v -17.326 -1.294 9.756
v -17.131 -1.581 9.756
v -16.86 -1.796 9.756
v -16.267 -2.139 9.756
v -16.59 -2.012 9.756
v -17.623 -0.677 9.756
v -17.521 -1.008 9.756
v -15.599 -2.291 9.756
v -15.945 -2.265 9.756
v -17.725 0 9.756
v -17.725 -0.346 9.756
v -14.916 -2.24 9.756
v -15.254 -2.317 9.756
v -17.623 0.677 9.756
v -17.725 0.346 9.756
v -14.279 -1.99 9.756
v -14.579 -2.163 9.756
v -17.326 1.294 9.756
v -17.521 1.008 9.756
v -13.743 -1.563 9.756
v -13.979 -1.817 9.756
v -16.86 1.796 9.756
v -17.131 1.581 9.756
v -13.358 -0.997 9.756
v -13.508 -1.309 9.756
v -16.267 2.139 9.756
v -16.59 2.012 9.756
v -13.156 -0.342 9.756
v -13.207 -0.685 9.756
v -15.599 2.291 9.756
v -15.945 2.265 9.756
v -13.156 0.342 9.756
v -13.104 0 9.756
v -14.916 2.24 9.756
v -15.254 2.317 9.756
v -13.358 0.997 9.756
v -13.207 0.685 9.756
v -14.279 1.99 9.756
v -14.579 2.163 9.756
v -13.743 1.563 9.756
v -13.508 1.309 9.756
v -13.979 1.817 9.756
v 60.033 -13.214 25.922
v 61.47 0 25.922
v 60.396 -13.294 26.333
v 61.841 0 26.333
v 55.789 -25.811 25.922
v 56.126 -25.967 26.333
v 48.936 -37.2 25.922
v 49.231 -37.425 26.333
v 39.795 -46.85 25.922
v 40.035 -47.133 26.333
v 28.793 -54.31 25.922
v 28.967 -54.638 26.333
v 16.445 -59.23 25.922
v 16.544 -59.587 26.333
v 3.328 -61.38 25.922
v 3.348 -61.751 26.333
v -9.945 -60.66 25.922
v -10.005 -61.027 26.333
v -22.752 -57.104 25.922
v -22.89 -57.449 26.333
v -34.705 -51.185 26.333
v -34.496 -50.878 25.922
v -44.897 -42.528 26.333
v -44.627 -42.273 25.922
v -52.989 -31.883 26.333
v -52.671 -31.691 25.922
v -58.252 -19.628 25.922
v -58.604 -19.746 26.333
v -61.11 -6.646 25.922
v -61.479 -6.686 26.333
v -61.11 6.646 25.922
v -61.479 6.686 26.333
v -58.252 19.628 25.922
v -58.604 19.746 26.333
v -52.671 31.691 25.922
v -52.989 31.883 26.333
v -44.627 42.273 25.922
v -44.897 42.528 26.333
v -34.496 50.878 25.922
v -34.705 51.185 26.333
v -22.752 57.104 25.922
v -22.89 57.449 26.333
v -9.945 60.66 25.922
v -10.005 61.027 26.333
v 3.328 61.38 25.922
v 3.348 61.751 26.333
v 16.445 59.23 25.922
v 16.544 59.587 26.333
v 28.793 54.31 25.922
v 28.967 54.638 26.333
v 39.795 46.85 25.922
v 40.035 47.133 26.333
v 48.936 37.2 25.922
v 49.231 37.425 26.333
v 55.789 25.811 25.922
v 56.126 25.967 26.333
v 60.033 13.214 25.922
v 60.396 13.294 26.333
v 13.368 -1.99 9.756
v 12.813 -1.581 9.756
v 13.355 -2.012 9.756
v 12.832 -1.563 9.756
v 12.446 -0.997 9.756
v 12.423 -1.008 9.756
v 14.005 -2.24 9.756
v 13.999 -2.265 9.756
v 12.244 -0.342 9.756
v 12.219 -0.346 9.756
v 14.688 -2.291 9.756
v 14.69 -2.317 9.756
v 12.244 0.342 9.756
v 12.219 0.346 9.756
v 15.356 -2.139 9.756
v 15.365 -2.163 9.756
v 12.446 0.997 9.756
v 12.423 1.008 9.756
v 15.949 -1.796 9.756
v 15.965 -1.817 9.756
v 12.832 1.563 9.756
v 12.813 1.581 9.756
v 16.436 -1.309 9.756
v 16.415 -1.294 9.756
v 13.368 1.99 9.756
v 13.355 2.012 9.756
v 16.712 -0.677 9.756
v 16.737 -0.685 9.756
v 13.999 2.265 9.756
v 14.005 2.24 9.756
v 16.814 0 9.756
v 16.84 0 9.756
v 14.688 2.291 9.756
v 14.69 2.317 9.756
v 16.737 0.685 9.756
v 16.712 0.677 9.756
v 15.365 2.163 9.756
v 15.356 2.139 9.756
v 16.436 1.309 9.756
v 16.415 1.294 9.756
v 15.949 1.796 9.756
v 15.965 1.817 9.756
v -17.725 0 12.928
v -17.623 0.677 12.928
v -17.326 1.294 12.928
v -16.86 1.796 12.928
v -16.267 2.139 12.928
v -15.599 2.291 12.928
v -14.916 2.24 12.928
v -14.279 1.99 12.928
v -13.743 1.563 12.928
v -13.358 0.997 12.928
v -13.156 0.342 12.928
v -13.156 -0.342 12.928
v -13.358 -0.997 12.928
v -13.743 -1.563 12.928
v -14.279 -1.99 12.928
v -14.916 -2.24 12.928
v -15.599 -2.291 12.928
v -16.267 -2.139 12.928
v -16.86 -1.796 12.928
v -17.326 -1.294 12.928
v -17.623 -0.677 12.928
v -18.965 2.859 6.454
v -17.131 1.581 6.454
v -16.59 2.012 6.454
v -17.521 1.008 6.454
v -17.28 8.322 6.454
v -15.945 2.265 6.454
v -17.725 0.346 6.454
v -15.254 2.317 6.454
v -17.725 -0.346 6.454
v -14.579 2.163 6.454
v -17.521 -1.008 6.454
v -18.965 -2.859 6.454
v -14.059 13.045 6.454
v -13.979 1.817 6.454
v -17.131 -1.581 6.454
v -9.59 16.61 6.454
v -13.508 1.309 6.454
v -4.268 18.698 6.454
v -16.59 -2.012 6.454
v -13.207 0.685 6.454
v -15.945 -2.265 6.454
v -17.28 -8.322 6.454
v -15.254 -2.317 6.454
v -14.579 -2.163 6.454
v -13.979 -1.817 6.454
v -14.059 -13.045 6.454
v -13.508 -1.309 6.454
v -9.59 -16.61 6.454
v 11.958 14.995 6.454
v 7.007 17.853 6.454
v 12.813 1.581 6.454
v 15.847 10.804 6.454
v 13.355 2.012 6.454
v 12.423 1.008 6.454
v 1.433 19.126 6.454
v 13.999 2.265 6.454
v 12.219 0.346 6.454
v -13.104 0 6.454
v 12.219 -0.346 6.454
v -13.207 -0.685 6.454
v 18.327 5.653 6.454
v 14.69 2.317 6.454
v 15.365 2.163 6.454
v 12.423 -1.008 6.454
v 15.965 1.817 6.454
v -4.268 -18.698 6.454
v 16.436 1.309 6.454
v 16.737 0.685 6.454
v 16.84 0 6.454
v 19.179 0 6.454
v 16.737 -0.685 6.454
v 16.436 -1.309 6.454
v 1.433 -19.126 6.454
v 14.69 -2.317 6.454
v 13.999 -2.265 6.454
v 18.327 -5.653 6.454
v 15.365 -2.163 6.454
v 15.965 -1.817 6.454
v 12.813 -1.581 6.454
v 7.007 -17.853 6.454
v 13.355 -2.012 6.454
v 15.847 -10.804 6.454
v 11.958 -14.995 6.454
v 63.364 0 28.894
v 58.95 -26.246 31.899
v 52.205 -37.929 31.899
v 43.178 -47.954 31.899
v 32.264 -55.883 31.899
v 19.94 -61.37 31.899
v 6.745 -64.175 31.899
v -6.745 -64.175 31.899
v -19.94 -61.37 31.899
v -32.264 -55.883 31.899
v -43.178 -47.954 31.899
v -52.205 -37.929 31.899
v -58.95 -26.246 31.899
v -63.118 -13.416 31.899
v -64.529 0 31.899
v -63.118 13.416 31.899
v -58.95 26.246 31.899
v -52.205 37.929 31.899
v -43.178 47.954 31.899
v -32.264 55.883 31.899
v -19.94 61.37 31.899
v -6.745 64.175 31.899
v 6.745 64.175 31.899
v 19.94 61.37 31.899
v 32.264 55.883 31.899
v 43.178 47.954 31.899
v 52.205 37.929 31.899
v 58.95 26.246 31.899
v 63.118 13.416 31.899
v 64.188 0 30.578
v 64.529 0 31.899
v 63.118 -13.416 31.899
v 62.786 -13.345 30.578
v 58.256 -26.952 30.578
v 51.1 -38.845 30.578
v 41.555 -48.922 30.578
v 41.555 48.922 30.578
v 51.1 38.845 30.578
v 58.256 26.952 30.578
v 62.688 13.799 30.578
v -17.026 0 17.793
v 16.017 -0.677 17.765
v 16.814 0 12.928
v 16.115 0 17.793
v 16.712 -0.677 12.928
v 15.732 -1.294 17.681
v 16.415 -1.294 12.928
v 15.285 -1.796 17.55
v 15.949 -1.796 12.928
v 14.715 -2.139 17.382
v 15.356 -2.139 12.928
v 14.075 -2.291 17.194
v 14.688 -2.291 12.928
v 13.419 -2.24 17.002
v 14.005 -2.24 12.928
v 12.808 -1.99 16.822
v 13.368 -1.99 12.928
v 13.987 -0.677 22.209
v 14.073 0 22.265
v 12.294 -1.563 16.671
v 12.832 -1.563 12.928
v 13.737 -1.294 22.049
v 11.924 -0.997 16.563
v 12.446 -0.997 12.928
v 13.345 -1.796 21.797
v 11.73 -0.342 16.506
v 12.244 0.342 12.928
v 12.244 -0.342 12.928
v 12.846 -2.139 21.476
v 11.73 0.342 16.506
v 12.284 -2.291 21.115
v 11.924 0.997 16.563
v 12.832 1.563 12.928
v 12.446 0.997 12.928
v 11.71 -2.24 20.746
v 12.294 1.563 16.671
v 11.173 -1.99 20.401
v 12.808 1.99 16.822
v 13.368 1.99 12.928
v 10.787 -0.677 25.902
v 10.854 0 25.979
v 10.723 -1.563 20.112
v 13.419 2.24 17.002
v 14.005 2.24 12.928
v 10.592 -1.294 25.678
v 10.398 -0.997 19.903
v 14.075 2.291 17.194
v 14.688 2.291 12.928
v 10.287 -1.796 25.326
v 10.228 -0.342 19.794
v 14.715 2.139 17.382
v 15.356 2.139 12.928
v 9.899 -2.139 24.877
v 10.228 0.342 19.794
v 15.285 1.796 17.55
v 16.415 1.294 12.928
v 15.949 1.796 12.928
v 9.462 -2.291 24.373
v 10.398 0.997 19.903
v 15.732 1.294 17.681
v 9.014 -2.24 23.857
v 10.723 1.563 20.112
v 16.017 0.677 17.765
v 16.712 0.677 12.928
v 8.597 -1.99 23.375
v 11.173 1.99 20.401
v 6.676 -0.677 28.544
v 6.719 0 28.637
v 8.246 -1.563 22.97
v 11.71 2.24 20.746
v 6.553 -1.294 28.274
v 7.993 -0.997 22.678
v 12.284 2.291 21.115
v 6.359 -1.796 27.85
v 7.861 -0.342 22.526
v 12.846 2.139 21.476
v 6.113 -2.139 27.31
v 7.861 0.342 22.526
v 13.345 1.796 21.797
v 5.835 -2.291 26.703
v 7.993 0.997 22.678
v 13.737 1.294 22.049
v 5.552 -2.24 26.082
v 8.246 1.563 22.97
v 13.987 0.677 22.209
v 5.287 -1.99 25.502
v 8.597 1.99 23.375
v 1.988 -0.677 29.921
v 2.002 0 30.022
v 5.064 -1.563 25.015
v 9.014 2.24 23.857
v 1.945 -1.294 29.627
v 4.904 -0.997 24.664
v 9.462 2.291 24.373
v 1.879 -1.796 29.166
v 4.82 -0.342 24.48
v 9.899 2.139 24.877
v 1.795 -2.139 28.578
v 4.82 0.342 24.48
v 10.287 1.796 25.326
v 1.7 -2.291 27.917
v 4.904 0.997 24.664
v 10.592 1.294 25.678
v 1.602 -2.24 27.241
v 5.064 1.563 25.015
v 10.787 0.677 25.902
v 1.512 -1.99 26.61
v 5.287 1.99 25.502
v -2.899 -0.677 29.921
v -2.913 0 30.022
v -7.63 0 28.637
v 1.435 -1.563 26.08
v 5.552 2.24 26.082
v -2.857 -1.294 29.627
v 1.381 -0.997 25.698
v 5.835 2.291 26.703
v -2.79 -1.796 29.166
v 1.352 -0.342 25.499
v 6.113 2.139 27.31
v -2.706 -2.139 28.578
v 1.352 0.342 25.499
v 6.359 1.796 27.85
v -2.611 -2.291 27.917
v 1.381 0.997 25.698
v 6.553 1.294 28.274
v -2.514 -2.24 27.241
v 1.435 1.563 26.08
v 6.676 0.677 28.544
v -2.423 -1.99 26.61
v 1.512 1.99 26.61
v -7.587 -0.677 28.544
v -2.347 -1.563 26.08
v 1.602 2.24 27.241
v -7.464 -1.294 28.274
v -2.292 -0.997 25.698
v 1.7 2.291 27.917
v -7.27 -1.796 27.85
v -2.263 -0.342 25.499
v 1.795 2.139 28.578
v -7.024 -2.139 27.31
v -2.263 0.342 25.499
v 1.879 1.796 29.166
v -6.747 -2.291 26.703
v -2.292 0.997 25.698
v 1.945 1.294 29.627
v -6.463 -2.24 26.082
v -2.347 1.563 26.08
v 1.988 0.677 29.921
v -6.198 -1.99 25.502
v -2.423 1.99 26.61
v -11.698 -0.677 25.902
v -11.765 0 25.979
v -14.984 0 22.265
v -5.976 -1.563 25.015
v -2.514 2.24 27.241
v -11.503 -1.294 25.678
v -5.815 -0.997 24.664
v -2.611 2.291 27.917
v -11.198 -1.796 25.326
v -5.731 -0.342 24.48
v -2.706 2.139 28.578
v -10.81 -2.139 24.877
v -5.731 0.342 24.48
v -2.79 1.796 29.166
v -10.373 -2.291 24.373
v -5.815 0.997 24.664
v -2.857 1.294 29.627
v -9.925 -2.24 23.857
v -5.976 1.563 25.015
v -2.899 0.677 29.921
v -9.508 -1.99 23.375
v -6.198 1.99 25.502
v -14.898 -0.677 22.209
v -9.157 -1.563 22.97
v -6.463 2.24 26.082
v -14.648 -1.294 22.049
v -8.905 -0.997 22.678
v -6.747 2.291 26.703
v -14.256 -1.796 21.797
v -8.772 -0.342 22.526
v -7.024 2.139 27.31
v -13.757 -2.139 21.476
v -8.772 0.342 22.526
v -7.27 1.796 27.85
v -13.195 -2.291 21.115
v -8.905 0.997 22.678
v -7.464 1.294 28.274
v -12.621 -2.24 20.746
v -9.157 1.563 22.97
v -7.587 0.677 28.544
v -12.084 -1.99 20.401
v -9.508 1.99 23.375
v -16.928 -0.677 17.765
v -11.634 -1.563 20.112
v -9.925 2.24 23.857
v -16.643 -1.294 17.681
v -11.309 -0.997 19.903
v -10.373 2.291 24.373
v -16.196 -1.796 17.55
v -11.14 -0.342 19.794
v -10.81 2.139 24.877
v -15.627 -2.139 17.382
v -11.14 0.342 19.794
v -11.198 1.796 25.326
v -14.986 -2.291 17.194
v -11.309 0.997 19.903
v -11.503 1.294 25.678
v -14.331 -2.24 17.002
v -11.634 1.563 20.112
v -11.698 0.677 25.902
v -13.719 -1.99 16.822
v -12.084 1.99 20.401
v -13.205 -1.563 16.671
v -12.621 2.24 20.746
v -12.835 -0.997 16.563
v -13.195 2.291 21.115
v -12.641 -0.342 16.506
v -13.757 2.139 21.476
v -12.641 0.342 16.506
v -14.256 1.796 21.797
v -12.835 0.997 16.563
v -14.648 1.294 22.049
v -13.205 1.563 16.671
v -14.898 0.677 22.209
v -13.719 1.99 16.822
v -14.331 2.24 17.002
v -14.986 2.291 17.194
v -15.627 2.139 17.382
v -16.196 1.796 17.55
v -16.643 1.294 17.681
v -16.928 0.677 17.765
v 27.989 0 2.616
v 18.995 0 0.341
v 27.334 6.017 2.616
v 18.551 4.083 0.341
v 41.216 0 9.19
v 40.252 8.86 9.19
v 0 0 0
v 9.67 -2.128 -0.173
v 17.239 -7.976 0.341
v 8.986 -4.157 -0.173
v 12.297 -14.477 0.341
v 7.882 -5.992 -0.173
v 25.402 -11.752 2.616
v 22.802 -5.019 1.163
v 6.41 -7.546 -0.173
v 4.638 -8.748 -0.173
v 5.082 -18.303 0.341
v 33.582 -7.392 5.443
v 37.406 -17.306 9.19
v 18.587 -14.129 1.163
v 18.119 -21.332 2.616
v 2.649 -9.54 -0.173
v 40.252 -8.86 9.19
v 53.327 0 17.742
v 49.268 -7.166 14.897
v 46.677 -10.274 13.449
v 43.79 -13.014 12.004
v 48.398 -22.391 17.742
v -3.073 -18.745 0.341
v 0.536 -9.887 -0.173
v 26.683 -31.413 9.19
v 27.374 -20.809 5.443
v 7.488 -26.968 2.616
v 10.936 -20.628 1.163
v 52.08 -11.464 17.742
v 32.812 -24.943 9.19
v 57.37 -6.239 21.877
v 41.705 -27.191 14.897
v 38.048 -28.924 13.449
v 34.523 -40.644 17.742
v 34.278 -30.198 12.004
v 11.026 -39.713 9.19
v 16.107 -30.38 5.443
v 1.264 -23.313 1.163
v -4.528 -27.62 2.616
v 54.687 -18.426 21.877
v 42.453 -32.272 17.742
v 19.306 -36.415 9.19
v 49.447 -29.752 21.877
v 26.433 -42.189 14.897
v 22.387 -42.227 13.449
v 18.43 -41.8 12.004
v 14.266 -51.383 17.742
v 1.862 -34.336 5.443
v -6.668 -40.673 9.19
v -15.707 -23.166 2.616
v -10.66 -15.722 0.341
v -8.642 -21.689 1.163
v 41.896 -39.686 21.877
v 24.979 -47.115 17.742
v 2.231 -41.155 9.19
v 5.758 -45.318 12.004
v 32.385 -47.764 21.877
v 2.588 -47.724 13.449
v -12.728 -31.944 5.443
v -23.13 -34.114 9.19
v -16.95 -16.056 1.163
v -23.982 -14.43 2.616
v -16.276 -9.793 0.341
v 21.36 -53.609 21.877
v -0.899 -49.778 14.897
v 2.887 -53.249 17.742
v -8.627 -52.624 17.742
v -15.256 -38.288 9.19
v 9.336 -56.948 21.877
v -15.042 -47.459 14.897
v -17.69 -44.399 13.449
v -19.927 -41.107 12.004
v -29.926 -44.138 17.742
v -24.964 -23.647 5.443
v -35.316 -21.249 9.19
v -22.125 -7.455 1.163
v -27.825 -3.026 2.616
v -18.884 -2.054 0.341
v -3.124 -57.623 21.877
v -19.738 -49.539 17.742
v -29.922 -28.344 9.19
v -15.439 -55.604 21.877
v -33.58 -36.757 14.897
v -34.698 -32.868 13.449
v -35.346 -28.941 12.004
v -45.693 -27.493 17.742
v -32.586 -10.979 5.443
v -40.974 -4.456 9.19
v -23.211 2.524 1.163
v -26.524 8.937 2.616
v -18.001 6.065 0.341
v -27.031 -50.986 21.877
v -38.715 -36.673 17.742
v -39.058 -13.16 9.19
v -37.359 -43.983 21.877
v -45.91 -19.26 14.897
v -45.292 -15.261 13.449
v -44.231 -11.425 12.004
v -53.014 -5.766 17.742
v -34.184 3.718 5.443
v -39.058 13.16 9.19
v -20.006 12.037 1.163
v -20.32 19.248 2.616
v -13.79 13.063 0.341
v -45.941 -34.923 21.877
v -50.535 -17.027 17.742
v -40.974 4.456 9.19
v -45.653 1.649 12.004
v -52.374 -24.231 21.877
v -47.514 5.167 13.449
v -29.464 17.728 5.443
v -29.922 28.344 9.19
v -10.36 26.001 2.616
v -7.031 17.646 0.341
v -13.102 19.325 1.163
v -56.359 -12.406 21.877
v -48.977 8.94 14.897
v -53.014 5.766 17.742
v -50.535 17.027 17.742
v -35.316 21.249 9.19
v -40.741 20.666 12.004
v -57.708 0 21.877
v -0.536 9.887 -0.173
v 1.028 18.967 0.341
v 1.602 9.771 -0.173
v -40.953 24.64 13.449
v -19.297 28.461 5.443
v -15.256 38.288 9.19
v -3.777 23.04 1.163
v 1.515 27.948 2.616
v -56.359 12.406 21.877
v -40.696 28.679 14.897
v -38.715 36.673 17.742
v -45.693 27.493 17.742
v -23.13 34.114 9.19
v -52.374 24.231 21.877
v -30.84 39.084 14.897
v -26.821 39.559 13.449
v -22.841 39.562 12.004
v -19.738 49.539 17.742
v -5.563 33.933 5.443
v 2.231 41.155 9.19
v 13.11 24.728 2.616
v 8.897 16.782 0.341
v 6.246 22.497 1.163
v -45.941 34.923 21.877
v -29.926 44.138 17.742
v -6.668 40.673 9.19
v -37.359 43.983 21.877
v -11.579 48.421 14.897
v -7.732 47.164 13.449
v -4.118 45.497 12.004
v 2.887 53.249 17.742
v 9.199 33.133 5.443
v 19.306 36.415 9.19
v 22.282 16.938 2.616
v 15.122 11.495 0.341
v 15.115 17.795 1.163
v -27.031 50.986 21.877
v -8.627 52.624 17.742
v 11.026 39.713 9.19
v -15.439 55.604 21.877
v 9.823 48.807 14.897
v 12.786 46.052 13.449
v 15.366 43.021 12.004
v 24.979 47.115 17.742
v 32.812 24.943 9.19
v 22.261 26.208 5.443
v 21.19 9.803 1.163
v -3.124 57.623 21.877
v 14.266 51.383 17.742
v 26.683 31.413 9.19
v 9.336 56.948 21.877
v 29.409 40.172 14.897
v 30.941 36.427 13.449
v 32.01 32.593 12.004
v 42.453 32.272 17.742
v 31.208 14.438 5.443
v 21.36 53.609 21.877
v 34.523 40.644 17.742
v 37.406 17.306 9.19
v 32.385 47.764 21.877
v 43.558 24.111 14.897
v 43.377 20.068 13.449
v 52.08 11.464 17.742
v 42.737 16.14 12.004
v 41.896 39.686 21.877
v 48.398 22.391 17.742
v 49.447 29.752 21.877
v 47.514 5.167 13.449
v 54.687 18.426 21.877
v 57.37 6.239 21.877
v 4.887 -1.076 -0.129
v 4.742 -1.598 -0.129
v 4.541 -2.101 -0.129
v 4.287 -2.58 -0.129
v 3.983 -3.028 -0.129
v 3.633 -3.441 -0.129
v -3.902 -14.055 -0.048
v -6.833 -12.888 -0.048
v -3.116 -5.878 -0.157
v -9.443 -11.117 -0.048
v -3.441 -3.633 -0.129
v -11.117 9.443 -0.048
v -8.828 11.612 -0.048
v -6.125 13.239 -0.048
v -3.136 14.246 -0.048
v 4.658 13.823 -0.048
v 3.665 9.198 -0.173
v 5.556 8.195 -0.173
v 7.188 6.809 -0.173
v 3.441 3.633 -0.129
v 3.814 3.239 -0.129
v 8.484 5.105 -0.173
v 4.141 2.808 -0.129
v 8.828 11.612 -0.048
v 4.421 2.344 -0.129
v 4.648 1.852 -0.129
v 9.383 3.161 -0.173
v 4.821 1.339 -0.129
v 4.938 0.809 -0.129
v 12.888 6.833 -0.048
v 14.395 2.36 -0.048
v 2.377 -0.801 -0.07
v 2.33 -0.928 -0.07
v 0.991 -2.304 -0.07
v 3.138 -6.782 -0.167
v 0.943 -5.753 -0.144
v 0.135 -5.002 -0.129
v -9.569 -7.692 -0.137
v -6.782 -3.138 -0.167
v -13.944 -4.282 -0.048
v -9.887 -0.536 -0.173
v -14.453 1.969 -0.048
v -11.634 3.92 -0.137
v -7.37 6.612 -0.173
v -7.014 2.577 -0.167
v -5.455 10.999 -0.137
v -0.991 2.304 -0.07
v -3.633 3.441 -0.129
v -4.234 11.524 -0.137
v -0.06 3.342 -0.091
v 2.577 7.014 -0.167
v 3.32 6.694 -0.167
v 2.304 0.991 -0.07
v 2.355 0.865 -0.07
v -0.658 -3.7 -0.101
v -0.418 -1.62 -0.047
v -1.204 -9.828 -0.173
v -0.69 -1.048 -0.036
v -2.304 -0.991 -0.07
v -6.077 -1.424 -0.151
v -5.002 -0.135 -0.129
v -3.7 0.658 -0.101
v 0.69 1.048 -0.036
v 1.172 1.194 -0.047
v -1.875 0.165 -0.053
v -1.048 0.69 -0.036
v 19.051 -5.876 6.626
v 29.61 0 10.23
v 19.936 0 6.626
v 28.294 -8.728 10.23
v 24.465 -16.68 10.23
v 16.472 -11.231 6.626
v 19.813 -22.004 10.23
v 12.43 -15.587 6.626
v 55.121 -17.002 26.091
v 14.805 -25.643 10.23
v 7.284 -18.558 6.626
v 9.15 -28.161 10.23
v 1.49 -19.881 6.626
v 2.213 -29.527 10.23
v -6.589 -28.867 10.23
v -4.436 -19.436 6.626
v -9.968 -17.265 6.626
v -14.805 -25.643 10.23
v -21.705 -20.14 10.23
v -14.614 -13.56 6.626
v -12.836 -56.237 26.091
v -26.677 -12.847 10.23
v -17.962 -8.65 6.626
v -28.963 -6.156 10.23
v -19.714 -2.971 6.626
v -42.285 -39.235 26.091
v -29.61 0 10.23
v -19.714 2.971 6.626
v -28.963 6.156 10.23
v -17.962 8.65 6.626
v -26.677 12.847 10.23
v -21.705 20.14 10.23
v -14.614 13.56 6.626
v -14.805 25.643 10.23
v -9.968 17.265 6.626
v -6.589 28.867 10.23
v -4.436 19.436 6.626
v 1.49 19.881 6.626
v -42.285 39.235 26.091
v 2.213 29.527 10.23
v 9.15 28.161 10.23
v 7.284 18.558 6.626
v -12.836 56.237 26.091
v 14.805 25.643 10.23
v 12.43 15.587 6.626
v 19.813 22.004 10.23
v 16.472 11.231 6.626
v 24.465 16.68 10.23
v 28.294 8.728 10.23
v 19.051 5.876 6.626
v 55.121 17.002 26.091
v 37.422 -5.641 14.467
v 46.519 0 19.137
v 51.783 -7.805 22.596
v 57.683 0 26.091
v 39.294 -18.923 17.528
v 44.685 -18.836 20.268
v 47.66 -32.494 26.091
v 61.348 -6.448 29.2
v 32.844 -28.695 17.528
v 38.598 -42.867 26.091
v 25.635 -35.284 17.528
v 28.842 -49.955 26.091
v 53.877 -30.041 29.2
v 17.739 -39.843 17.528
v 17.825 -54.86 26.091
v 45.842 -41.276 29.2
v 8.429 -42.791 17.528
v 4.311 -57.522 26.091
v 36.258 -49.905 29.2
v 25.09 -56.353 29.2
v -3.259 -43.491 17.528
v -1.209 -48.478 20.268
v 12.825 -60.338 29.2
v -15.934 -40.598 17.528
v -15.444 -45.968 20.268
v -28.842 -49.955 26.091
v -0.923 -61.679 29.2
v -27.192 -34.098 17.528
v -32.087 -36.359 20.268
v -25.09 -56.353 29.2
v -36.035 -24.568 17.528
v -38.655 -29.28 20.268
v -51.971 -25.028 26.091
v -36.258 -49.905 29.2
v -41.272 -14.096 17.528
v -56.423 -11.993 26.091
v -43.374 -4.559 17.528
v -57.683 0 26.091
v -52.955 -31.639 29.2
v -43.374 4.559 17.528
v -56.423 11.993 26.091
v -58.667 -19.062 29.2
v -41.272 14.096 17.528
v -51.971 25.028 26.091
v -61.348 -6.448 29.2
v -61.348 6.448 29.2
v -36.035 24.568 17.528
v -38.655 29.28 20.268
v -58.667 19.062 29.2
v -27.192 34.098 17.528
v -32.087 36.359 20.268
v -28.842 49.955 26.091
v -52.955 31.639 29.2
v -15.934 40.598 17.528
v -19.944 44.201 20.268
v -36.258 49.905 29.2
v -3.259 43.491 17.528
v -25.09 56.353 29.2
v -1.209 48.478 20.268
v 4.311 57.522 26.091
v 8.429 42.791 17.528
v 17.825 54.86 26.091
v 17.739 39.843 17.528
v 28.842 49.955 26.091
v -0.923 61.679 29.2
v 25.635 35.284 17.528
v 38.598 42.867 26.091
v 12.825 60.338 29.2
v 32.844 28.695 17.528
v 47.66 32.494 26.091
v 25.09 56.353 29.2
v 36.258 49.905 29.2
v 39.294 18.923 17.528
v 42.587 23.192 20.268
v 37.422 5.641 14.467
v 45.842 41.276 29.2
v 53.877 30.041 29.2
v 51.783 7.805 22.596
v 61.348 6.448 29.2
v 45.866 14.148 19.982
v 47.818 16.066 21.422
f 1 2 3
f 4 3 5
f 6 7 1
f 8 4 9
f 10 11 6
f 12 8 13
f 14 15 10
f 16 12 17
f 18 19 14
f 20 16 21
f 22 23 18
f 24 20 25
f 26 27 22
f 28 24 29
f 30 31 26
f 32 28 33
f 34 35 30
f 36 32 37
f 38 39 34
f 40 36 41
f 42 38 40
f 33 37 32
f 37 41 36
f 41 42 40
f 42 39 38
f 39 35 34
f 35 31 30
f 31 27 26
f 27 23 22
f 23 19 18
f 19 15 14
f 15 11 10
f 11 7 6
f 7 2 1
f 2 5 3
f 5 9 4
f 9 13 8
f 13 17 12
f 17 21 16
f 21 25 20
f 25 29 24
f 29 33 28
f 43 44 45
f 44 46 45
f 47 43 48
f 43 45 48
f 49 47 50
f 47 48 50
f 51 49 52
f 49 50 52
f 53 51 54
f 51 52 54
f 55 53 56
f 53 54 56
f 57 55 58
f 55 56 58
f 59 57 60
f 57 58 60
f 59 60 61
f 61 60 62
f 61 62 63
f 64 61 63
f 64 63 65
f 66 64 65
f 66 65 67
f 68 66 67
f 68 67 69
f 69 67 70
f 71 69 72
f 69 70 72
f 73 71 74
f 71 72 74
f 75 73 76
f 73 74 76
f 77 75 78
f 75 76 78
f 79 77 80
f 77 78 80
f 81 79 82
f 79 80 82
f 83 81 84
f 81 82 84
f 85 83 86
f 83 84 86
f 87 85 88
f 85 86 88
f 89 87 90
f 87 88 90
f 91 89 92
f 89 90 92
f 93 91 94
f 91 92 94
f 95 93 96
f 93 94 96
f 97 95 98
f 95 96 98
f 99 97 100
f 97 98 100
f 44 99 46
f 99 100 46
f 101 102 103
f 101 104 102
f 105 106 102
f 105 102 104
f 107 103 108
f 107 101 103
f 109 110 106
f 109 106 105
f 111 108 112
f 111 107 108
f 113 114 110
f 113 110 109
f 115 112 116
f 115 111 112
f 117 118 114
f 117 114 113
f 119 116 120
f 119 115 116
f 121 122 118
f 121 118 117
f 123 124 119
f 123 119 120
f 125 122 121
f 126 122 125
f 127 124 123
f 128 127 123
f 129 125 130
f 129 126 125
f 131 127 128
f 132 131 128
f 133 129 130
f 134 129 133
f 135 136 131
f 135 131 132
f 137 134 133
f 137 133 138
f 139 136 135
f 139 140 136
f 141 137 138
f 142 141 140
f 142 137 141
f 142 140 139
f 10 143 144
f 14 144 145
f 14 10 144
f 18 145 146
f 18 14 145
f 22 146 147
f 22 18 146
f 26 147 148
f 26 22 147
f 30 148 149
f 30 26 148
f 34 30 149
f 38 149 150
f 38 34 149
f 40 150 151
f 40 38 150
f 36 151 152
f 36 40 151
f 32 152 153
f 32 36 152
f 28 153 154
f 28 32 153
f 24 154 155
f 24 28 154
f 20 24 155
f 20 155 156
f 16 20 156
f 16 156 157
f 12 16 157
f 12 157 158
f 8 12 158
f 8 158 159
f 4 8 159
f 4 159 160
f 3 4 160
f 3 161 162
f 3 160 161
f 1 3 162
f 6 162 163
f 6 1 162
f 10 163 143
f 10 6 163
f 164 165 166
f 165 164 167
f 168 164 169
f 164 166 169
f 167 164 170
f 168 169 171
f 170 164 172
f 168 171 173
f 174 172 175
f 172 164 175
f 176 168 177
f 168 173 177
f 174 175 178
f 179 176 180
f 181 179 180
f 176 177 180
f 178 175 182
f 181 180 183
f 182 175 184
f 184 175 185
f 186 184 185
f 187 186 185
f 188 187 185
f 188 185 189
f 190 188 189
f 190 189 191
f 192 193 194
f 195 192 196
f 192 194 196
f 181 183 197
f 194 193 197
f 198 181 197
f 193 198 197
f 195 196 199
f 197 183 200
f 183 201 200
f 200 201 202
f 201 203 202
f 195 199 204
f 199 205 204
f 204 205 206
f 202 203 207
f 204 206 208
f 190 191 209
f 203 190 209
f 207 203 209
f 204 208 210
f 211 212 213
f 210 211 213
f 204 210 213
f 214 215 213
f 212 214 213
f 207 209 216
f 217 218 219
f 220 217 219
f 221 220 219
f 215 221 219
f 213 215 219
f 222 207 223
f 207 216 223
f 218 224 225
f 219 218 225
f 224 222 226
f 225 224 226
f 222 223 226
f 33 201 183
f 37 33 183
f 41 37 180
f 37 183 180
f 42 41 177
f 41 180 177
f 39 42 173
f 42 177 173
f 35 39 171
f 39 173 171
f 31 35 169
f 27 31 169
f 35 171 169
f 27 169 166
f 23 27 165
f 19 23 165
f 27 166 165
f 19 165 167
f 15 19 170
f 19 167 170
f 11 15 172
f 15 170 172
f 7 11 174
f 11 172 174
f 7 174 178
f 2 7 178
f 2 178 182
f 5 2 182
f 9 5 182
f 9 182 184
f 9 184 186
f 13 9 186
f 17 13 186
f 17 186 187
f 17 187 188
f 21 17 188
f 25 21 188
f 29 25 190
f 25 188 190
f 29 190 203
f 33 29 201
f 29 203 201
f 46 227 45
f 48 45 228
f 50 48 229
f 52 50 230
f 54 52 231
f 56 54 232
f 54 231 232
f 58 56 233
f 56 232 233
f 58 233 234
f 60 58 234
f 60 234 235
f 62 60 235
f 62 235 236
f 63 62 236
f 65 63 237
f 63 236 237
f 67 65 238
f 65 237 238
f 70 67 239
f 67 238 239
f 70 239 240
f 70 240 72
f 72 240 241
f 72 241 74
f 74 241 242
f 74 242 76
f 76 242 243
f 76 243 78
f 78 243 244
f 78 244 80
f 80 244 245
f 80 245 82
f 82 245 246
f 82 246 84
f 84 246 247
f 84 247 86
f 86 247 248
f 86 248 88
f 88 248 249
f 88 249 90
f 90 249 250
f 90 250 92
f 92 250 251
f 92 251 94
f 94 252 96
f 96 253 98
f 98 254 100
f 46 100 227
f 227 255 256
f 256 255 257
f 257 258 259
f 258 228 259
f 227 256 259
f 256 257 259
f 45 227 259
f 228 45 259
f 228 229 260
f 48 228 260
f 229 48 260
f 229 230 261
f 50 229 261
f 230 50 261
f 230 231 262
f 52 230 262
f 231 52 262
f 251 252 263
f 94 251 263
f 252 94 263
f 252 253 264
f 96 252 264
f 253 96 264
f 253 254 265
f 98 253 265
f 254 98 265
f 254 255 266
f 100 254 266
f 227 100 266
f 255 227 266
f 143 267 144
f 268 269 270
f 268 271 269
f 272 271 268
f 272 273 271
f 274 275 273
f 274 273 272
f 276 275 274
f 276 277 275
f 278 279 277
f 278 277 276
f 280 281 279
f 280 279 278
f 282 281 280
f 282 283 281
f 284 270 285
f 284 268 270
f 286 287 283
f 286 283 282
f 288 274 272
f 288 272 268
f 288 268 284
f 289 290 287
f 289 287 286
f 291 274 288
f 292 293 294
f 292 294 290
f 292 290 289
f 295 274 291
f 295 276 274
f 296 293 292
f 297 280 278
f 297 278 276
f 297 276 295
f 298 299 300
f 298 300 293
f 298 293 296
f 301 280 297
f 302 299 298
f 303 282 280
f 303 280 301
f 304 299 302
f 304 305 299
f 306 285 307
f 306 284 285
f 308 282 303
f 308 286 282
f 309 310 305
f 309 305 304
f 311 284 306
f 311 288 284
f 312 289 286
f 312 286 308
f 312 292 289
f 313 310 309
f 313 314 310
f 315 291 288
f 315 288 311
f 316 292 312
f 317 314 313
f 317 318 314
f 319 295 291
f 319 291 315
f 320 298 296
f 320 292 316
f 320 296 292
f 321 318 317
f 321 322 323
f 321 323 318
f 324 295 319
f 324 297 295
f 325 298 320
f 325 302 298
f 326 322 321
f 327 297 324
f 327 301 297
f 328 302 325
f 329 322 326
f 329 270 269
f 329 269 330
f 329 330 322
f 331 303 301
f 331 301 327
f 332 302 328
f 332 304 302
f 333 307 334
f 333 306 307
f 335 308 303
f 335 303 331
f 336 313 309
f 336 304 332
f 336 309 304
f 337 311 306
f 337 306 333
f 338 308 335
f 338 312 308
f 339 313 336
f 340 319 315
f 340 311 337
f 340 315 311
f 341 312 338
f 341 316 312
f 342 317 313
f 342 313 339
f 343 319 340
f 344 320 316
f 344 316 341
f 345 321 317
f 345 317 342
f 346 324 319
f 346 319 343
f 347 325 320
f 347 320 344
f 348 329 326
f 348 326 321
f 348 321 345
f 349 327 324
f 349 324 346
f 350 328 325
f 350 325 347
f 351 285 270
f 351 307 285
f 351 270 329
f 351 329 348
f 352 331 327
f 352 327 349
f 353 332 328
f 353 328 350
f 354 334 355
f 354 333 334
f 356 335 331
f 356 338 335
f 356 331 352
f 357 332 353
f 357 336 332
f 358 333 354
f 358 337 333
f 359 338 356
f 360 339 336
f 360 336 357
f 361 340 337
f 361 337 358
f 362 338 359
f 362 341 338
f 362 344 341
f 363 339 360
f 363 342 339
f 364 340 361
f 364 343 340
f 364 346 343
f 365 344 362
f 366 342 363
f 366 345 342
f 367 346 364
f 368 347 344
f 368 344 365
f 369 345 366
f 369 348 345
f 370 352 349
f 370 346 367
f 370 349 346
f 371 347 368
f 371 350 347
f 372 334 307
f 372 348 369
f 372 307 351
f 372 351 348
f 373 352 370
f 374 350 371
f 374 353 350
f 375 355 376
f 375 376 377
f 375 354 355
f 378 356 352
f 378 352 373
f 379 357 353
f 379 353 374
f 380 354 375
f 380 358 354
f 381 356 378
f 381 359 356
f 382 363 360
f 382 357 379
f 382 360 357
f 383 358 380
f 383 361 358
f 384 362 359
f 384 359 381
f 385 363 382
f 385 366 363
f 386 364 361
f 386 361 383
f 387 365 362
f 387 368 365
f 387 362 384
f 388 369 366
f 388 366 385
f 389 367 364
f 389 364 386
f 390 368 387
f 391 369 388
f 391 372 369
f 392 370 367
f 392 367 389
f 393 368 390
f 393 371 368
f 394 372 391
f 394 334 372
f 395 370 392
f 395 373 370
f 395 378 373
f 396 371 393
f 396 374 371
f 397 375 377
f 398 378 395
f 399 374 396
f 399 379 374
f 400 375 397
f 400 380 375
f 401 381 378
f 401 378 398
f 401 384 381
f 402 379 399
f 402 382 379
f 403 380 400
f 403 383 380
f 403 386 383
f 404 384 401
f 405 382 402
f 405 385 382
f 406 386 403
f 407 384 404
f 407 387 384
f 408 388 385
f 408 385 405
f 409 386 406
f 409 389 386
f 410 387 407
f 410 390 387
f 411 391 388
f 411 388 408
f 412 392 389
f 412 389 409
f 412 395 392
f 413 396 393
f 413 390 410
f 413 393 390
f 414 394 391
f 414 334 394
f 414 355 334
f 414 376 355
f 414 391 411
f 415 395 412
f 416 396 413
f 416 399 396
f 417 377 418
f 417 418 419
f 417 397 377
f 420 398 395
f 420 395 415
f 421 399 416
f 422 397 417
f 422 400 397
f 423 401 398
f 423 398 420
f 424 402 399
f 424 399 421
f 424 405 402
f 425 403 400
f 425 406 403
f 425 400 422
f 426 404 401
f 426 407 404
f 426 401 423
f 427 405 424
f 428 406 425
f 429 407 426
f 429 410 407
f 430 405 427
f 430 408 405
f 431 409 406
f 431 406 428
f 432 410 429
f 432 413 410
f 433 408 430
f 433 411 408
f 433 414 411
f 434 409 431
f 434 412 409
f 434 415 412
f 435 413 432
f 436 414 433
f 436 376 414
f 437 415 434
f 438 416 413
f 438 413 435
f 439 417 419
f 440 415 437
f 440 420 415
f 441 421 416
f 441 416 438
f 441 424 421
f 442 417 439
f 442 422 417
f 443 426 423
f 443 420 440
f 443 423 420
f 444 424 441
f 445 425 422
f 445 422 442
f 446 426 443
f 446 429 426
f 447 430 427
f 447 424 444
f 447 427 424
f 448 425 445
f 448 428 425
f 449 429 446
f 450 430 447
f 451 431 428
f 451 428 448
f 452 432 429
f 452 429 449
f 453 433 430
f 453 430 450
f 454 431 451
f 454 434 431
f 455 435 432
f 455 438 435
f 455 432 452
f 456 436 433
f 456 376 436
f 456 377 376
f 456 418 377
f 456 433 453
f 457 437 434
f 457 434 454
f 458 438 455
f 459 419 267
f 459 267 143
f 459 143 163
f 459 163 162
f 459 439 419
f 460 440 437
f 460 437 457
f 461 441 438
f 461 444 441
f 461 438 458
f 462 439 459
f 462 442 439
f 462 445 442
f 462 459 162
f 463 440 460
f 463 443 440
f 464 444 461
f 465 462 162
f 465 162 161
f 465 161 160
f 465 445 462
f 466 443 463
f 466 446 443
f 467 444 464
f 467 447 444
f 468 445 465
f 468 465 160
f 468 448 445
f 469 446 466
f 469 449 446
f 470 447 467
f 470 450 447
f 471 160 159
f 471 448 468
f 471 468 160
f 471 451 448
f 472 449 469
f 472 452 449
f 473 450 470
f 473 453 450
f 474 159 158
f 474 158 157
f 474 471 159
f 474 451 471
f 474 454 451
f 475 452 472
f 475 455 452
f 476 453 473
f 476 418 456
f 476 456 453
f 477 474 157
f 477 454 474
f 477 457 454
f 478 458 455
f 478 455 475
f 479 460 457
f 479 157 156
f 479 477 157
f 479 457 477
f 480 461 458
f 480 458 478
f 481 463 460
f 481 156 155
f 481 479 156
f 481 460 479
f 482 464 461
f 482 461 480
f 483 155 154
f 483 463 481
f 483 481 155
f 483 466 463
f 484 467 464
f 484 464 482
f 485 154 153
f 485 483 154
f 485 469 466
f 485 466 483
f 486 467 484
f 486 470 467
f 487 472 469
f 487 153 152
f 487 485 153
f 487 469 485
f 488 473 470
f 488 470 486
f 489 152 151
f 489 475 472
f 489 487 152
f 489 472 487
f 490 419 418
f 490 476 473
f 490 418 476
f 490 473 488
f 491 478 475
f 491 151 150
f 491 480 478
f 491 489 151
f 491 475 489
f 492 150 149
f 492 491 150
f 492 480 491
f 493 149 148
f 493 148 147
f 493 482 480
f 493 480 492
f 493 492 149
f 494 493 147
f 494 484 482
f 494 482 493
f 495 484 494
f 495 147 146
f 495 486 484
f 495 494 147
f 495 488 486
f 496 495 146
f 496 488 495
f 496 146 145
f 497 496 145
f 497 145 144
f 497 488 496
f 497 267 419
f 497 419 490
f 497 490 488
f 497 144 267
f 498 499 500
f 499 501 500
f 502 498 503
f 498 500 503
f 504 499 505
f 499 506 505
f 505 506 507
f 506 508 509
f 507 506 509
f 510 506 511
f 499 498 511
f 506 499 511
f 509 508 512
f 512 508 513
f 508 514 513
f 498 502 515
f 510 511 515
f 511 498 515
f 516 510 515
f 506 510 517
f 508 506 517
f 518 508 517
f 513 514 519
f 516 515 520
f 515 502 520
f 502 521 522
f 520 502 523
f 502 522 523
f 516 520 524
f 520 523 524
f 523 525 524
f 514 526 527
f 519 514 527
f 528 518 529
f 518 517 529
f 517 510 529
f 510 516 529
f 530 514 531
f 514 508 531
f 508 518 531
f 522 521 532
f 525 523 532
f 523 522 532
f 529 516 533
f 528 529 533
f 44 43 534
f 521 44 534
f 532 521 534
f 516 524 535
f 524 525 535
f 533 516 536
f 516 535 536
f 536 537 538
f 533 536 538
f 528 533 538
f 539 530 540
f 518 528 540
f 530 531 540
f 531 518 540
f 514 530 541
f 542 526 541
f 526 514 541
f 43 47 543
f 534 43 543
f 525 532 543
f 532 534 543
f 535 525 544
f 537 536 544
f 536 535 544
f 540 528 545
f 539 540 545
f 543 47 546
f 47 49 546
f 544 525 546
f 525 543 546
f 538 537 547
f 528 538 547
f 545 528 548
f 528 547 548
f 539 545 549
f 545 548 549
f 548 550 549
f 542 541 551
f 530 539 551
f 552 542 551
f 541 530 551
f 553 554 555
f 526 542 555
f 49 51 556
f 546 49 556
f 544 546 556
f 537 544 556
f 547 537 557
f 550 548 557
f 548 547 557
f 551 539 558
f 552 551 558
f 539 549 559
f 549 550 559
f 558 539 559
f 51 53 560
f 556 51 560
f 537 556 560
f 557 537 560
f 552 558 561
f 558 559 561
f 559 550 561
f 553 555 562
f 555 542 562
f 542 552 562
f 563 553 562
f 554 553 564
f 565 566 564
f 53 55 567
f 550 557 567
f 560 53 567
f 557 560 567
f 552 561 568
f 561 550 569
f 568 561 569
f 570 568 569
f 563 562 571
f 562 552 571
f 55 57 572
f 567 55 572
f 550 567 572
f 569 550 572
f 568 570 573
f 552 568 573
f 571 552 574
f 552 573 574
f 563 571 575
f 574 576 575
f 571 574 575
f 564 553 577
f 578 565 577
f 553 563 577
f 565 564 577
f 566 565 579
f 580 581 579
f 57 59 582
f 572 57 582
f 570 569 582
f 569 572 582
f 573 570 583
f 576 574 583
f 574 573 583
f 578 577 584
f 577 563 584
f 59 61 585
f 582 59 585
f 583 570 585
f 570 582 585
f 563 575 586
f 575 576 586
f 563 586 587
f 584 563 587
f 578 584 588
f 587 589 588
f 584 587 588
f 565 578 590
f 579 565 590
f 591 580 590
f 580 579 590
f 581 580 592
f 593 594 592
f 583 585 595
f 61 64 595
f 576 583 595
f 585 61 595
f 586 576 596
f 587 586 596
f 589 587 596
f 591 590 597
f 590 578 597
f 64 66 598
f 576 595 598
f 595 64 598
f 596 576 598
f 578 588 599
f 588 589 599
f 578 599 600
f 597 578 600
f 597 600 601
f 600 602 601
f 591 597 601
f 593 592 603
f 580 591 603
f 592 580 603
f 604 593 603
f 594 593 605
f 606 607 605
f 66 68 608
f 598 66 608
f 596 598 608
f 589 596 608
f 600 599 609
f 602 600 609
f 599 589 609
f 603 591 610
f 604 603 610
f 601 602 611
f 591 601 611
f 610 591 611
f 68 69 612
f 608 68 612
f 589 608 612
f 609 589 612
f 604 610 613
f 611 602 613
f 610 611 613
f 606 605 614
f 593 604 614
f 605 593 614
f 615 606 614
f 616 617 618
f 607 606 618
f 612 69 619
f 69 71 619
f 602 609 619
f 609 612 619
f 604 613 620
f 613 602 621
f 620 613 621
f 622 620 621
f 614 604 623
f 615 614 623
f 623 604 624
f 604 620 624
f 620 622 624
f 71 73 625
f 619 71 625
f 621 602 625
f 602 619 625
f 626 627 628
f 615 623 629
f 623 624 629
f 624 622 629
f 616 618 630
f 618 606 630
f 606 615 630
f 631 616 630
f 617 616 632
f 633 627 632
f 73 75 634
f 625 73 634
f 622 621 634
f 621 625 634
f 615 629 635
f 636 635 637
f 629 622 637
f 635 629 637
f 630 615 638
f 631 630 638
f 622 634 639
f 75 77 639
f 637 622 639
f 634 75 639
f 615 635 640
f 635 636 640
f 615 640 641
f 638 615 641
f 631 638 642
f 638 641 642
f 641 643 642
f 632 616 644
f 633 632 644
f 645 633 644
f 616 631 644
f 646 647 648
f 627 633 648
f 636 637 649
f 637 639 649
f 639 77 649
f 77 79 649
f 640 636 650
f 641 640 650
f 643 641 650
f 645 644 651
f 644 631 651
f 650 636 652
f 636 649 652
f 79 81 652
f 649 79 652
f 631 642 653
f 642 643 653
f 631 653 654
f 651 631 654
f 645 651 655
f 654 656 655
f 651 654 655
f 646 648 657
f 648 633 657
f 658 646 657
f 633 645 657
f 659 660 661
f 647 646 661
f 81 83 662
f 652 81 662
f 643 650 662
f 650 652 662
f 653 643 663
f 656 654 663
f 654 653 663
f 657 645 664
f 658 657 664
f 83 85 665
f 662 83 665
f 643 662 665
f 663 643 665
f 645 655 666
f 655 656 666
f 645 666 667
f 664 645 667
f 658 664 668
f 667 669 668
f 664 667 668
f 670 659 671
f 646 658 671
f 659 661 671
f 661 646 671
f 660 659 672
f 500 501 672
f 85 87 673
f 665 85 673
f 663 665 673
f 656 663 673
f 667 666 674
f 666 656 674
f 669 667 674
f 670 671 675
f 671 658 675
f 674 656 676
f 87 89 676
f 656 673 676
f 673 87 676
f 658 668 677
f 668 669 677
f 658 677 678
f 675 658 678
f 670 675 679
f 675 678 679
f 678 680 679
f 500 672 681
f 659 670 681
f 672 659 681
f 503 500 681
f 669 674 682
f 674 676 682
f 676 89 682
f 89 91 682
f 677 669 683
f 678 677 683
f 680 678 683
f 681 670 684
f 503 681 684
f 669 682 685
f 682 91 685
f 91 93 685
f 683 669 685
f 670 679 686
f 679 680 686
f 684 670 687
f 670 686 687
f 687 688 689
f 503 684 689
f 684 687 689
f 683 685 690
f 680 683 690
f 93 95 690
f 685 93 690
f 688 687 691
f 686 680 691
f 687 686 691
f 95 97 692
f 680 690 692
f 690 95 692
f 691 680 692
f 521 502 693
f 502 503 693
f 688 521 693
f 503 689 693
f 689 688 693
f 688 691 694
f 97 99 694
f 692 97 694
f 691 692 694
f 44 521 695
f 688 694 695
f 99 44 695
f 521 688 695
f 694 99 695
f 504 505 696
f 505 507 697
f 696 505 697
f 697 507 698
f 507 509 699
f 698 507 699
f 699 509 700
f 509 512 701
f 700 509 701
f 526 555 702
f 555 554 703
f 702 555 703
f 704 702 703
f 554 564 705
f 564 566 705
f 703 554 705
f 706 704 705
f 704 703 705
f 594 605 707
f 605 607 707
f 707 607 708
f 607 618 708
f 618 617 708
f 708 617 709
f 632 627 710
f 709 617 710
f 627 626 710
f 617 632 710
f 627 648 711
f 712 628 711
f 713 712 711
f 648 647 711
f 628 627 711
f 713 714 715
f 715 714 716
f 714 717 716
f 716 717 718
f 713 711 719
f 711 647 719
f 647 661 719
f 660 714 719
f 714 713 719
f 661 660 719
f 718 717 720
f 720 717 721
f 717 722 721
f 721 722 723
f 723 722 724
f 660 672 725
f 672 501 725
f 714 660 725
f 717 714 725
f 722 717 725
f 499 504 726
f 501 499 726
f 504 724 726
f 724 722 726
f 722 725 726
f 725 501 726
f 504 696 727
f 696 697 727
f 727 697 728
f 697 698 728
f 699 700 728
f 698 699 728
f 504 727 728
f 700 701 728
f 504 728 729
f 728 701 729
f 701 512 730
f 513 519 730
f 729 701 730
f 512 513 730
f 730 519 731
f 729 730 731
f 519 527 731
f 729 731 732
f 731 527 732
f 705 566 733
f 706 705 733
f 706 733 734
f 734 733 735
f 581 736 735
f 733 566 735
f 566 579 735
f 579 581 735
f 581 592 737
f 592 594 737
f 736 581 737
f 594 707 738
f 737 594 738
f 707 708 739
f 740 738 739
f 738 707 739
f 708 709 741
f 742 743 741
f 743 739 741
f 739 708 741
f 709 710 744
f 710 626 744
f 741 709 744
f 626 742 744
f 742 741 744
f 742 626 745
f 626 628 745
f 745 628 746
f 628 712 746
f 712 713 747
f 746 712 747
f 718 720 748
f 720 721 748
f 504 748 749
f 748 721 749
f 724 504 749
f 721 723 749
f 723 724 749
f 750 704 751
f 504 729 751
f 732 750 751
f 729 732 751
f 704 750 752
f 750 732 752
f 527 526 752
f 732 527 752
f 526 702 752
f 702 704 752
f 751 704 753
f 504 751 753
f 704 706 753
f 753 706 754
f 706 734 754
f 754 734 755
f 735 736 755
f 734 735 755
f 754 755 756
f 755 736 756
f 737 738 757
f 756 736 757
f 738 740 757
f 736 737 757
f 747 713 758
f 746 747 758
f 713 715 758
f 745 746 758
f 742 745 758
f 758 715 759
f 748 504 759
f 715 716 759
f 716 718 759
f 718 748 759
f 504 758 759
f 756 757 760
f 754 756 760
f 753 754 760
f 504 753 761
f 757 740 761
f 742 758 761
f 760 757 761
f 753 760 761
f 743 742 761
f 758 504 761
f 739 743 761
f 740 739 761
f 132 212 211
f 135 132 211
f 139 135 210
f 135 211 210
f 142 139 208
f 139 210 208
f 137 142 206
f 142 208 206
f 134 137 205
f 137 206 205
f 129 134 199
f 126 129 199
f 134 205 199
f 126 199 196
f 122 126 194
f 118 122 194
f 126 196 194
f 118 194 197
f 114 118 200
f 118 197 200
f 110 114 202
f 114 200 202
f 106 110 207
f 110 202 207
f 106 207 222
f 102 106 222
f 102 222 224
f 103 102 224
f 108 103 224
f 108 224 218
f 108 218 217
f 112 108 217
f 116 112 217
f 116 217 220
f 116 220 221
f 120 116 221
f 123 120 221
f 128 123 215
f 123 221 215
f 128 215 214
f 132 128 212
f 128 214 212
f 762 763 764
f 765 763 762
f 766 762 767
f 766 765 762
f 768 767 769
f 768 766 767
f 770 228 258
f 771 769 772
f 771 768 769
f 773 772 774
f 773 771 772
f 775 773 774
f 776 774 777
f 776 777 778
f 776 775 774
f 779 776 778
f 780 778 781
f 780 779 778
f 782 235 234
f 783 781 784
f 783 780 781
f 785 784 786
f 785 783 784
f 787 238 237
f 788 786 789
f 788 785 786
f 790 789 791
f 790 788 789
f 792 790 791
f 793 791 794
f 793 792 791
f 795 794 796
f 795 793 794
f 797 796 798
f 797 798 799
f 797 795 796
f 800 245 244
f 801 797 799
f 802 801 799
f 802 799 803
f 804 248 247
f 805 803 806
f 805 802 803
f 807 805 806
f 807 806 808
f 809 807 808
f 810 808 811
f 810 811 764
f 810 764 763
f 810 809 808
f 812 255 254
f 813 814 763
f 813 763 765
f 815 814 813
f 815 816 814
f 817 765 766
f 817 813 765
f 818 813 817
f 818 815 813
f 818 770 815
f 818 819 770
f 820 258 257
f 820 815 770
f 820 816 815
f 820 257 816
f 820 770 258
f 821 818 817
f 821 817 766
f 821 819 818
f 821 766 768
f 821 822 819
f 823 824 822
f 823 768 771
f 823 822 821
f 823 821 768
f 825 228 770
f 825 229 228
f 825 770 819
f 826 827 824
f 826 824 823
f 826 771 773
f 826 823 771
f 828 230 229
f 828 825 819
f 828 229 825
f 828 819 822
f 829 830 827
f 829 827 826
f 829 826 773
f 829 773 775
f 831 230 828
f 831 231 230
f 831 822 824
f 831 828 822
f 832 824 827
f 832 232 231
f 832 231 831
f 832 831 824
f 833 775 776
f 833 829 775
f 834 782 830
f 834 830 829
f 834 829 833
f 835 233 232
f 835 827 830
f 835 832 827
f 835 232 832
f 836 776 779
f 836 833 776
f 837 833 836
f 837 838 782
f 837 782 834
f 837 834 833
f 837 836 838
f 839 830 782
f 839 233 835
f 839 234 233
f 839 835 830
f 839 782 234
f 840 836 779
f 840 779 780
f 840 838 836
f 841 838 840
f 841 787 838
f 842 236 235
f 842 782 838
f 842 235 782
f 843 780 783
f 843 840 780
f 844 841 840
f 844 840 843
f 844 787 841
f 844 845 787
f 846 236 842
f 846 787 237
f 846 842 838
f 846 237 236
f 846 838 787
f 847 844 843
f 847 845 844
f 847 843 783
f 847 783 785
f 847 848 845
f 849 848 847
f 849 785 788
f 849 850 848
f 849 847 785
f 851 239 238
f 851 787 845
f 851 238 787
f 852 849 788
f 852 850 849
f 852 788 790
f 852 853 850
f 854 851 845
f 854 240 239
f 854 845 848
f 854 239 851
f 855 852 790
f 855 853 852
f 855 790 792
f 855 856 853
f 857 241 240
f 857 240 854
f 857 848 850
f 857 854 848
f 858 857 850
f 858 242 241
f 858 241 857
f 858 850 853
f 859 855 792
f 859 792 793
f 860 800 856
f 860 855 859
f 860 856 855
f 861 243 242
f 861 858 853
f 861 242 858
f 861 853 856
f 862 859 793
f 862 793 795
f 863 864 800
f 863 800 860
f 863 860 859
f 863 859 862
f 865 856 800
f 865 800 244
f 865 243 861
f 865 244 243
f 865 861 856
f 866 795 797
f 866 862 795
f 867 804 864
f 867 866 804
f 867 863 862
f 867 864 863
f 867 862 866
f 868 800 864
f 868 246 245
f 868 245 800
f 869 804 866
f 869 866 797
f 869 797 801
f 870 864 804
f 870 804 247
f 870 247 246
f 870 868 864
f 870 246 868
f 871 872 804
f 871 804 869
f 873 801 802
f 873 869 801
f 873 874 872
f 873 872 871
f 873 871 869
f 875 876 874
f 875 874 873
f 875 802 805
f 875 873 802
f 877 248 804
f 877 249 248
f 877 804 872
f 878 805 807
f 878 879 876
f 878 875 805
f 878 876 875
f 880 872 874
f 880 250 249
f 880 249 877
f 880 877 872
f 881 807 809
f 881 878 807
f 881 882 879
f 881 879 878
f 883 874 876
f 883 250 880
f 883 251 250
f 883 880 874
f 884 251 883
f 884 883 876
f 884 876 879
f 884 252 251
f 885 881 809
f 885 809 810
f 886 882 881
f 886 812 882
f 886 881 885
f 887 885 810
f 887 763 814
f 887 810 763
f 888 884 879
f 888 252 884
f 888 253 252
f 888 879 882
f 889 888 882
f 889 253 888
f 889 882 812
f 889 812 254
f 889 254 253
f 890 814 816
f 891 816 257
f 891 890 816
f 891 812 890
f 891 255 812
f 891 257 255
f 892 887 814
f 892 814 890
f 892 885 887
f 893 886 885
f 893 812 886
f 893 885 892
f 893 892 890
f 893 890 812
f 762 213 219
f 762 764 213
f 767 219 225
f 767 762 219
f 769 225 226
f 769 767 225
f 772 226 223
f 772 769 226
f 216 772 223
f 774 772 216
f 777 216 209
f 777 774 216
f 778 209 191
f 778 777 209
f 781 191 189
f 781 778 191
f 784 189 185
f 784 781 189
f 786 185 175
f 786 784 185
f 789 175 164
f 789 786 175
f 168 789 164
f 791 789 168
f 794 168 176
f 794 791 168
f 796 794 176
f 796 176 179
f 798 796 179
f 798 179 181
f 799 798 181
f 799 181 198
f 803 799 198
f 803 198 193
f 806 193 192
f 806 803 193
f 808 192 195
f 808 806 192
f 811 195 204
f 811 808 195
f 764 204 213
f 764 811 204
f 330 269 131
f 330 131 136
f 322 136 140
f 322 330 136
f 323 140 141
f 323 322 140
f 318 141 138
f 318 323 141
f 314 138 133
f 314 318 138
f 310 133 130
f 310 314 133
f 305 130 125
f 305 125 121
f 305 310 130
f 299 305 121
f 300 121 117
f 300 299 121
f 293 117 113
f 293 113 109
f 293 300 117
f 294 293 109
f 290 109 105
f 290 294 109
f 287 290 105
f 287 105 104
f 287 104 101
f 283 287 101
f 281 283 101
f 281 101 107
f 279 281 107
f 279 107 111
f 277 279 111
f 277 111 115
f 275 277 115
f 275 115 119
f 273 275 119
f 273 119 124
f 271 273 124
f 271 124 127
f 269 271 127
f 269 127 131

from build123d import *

# Parameters (mm, degrees)
F2_R     = 2.3237449832
F3_DEPTH = 3.302
F5_R     = 2.297710376


with BuildPart() as f1:
    # F0 (on Front) → F1 (revolve)
    with BuildSketch(Plane.XZ):
        with BuildLine():
            Line((0, 6.4537934959), (0, 0))
            add(Edge.make_bspline(
                [(0, 0), (5.3284348472, -0.151710014), (15.72935931, -0.4478428262), (29.3389014843, 1.9305018047), (51.2608661721, 14.7579911883), (58.4457571071, 22.5755026998), (61.4702167229, 25.9222669945)],
                knots=[0, 0, 0, 0, 0.2365448276, 0.4617274968, 0.7636676557, 0.990708621, 0.990708621, 0.990708621, 0.990708621], degree=3))
            add(Edge.make_bspline(
                [(61.4702167229, 25.9222669945), (61.5939891026, 26.0592293064), (61.7176621251, 26.1961773073), (61.8413351476, 26.3331253082)],
                knots=[0.990708621, 0.990708621, 0.990708621, 0.990708621, 1, 1, 1, 1], degree=3))
            add(Edge.make_bspline(
                [(19.9362844459, 6.6261832632), (23.0642313587, 6.9219216887), (33.6752694158, 9.3293914475), (61.2871102192, 26.430349091), (61.8413351476, 26.3331253082)],
                knots=[0.3055996998, 0.3055996998, 0.3055996998, 0.3055996998, 0.5203732934, 0.9456071412, 0.9456071412, 0.9456071412, 0.9456071412], degree=3))
            add(Edge.make_bspline(
                [(19.1792435944, 6.4537934959), (19.4312115798, 6.5108323155), (19.6831795651, 6.5678711352), (19.9362844459, 6.6261832632)],
                knots=[0, 0, 0, 0, 0.0222393359, 0.0222393359, 0.0222393359, 0.0222393359], degree=3))
            Line((19.1792435944, 6.4537934959), (16.7044717818, 6.4537934959))
            add(Edge.make_bspline(
                [(6.8562417291, 6.4537934959), (10.174427629, 6.4130106646), (13.4923483806, 6.3724655133), (16.7044717818, 6.4537934959)],
                knots=[0, 0, 0, 0, 0.2294042785, 0.2294042785, 0.2294042785, 0.2294042785], degree=3))
            Line((6.8562417291, 6.4537934959), (0, 6.4537934959))
        make_face()
        with BuildLine():
            add(Edge.make_bspline(
                [(19.9362844459, 6.6261832632), (23.0642313587, 6.9219216887), (33.6752694158, 9.3293914475), (61.2871102192, 26.430349091), (61.8413351476, 26.3331253082)],
                knots=[0.3055996998, 0.3055996998, 0.3055996998, 0.3055996998, 0.5203732934, 0.9456071412, 0.9456071412, 0.9456071412, 0.9456071412], degree=3))
            add(Edge.make_bspline(
                [(61.8413351476, 26.3331253082), (62.0067642507, 26.5338182356), (62.3784054543, 26.9846806276), (62.9694504555, 28.1334772092), (63.6191083309, 29.3888215381), (64.2996026431, 30.6889648721), (64.4545914573, 31.5078459617), (64.5285919309, 31.8988263607)],
                knots=[0, 0, 0, 0, 0.1633221476, 0.3669078679, 0.5840819466, 0.8014170695, 1, 1, 1, 1], degree=3))
            add(Edge.make_bspline(
                [(19.9362844459, 6.6261832632), (21.3897057398, 6.9610329441), (25.3615042434, 7.9649295402), (35.2978213246, 13.157404991), (48.0633763397, 19.7404571448), (59.9783712145, 27.3717771756), (63.2336508428, 30.610479627), (64.5285919309, 31.8988263607)],
                knots=[0.0222393359, 0.0222393359, 0.0222393359, 0.0222393359, 0.1499457799, 0.3624504838, 0.6085472144, 0.844281182, 1, 1, 1, 1], degree=3))
        make_face()
        with BuildLine():
            Line((16.7044717818, 6.4537934959), (6.8562417291, 6.4537934959))
            add(Edge.make_bspline(
                [(6.8562417291, 6.4537934959), (10.174427629, 6.4130106646), (13.4923483806, 6.3724655133), (16.7044717818, 6.4537934959)],
                knots=[0, 0, 0, 0, 0.2294042785, 0.2294042785, 0.2294042785, 0.2294042785], degree=3))
        make_face()
    revolve(axis=Axis((0, 0, 3.2268967479), (0, 0, -1)))

    # F2 (on face) → F3 (join)
    with BuildSketch(Plane.XY.offset(6.4537934959)):
        with Locations((14.5165240392, 0)):
            Circle(F2_R)
        with Locations((-15.4276872054, 0)):
            Circle(F2_R)
    extrude(amount=F3_DEPTH)

    # F6: sweep along a path in F4
    with BuildLine(Plane.XZ) as f6_path:
        Line((12.192779056, 9.7557934959), (12.192779056, 12.927793109))
        ThreePointArc((12.192779056, 12.927793109), (-0.4555815831, 25.5761537481), (-13.1039422222, 12.927793109))
        Line((-13.1039422222, 12.927793109), (-13.1039422222, 9.7557934959))
    # F5 (on face) → F6 (sweep)
    with BuildSketch(Plane.XY.offset(9.7557934959)):
        with Locations((14.5165240392, 0)):
            Circle(F5_R)
    sweep(path=f6_path.line)


solid = f1.part
